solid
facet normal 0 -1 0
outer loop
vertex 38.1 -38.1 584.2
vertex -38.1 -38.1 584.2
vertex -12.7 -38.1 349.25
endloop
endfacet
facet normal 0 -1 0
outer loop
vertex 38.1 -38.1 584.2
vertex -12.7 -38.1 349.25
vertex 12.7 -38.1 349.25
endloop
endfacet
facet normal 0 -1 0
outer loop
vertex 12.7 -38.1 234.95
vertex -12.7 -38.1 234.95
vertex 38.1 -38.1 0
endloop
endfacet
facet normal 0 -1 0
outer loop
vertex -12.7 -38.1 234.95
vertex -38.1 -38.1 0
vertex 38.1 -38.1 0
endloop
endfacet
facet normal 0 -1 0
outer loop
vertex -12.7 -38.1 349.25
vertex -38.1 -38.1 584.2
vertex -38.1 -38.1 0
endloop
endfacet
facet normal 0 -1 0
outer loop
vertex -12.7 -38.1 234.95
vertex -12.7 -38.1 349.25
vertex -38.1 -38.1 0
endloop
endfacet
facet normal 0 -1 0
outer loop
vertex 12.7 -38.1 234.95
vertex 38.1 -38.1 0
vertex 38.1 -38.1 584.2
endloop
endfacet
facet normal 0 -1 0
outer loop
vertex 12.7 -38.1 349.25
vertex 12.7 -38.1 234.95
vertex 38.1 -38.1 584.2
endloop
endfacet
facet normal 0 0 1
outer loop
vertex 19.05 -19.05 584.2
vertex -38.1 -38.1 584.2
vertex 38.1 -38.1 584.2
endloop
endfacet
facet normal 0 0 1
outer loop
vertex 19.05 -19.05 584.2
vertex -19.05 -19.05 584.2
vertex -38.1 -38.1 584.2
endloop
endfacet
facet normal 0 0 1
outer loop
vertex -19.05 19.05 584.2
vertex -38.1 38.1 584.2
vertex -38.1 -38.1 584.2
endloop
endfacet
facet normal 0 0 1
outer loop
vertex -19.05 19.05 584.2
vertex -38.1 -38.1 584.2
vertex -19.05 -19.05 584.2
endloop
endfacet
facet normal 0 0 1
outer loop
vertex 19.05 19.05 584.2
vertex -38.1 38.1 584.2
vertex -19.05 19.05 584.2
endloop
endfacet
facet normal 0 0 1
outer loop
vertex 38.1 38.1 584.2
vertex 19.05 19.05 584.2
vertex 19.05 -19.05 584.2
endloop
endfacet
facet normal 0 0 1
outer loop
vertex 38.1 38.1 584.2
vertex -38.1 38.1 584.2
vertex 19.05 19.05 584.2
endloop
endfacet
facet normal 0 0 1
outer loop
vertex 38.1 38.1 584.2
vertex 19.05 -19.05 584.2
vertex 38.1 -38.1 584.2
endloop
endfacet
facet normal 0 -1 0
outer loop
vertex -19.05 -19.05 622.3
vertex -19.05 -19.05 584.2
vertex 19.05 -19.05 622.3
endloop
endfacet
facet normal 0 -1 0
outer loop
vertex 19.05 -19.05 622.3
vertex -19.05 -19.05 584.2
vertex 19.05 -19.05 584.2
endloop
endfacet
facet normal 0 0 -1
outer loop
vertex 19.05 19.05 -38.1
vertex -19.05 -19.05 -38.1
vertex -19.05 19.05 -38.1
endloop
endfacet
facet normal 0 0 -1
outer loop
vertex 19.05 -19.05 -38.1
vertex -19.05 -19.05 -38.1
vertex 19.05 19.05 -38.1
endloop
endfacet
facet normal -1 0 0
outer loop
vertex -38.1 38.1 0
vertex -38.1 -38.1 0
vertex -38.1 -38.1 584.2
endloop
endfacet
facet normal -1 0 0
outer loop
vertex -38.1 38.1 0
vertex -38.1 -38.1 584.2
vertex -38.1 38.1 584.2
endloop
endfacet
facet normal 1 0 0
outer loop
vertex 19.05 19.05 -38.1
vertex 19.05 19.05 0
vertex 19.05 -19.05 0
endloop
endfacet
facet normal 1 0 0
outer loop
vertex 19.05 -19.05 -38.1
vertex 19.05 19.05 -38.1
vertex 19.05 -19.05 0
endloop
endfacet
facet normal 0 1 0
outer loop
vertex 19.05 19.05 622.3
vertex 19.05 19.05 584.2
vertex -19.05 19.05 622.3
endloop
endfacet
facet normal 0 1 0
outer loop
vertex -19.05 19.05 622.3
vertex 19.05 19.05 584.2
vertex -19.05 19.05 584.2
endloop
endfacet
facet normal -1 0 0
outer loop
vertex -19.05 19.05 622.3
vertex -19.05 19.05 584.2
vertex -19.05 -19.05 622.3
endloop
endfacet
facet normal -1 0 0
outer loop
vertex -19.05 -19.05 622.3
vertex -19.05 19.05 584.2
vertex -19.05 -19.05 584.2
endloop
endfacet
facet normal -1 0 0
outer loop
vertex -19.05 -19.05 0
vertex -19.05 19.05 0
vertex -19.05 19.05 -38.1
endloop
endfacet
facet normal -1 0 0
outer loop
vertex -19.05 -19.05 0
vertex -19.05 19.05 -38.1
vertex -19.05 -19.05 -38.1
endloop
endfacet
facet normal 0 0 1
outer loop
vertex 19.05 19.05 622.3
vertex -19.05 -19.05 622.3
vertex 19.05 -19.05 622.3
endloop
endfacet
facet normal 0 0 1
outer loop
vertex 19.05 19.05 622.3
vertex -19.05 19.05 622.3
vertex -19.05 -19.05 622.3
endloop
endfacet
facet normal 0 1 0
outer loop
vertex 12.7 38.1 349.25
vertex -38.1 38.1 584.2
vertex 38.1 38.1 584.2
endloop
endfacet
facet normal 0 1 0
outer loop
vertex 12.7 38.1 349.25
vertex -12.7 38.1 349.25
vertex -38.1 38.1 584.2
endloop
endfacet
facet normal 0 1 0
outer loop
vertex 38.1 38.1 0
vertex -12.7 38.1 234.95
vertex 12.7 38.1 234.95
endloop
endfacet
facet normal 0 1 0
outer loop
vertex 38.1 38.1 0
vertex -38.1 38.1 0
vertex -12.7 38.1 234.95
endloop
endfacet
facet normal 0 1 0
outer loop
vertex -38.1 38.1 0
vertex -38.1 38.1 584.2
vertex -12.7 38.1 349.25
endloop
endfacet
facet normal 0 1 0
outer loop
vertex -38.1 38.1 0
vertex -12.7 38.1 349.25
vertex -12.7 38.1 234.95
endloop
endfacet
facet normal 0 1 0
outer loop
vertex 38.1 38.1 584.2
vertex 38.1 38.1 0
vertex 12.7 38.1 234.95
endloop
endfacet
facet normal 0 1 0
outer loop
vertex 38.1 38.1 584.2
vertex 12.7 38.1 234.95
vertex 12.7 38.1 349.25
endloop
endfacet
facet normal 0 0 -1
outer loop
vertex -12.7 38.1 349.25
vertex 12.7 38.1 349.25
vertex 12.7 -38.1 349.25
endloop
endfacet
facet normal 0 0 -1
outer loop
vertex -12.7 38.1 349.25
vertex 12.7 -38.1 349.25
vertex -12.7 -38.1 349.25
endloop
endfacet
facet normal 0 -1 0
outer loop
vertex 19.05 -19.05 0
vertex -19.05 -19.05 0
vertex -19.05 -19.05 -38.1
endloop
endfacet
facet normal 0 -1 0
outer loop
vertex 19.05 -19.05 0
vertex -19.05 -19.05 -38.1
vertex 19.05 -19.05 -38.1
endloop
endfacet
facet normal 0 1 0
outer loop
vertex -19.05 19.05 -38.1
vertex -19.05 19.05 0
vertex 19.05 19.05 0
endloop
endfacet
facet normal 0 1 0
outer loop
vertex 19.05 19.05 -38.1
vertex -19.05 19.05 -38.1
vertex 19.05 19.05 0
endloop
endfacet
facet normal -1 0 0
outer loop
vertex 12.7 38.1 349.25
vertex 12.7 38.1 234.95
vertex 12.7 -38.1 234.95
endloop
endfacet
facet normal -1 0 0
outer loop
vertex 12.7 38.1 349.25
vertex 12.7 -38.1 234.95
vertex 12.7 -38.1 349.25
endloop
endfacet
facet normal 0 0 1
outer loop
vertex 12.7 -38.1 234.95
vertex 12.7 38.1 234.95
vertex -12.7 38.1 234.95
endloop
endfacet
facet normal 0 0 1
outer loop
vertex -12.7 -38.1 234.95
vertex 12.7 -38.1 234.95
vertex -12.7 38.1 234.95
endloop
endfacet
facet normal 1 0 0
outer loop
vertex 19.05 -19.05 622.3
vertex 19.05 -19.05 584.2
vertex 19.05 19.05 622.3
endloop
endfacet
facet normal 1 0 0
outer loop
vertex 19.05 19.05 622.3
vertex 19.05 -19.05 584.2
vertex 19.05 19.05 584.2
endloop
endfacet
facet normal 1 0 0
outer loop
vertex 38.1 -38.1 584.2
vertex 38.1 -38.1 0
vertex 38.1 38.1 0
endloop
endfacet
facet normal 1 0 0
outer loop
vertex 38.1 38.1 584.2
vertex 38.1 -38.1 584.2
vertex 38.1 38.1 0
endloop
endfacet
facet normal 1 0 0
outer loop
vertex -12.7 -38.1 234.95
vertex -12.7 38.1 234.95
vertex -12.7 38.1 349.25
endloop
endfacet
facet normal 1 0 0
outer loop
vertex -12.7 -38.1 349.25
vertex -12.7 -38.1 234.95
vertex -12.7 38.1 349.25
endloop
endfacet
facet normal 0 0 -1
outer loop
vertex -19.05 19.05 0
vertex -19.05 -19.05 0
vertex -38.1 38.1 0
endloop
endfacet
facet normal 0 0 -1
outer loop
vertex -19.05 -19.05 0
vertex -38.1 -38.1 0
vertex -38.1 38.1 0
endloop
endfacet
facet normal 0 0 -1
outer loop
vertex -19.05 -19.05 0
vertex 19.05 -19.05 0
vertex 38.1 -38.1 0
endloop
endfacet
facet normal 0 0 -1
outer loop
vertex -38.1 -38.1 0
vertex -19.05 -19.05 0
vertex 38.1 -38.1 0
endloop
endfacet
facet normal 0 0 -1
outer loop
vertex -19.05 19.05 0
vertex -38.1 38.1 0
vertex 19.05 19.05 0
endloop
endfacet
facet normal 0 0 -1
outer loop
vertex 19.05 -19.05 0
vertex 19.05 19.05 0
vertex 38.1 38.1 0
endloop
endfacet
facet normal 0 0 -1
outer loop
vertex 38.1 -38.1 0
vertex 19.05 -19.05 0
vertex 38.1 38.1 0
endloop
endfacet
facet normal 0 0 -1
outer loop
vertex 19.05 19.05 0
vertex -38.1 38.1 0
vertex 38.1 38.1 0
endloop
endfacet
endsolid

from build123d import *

# Parameters (mm, degrees)
F0_W     = 76.2
F0_H     = 76.2
F1_DEPTH = 584.2
F3_DEPTH = 38.1
F4_W     = 38.1
F4_H     = 38.1
F5_DEPTH = 38.1
F6_W     = 25.4
F6_H     = 114.3
F7_DEPTH = 76.201


with BuildPart() as f1:
    # F0 (on Top) → F1 (new body)
    with BuildSketch(Plane.XY):
        Rectangle(F0_W, F0_H)
    extrude(amount=F1_DEPTH)

    # F2 (on face) → F3 (join)
    with BuildSketch(Plane.XY.offset(584.2)):
        Polygon((-19.05, -19.05), (19.05, -19.05), (-19.05, 19.05), align=None)
        Polygon((-19.05, 19.05), (19.05, -19.05), (19.05, 19.05), align=None)
    extrude(amount=F3_DEPTH)

    # F4 (on face) → F5 (join)
    with BuildSketch(Plane(origin=(0, 0, 0), x_dir=(1, 0, 0), z_dir=(0, 0, -1))):
        Rectangle(F4_W, F4_H)
    extrude(amount=F5_DEPTH)

    # F6 (on face) → F7 (cut, through all)
    with BuildSketch(Plane(origin=(0, 38.1, 0), x_dir=(-1, 0, 0), z_dir=(0, 1, 0))):
        with Locations((0, 292.1)):
            Rectangle(F6_W, F6_H)
    extrude(amount=-F7_DEPTH, mode=Mode.SUBTRACT)


solid = f1.part
